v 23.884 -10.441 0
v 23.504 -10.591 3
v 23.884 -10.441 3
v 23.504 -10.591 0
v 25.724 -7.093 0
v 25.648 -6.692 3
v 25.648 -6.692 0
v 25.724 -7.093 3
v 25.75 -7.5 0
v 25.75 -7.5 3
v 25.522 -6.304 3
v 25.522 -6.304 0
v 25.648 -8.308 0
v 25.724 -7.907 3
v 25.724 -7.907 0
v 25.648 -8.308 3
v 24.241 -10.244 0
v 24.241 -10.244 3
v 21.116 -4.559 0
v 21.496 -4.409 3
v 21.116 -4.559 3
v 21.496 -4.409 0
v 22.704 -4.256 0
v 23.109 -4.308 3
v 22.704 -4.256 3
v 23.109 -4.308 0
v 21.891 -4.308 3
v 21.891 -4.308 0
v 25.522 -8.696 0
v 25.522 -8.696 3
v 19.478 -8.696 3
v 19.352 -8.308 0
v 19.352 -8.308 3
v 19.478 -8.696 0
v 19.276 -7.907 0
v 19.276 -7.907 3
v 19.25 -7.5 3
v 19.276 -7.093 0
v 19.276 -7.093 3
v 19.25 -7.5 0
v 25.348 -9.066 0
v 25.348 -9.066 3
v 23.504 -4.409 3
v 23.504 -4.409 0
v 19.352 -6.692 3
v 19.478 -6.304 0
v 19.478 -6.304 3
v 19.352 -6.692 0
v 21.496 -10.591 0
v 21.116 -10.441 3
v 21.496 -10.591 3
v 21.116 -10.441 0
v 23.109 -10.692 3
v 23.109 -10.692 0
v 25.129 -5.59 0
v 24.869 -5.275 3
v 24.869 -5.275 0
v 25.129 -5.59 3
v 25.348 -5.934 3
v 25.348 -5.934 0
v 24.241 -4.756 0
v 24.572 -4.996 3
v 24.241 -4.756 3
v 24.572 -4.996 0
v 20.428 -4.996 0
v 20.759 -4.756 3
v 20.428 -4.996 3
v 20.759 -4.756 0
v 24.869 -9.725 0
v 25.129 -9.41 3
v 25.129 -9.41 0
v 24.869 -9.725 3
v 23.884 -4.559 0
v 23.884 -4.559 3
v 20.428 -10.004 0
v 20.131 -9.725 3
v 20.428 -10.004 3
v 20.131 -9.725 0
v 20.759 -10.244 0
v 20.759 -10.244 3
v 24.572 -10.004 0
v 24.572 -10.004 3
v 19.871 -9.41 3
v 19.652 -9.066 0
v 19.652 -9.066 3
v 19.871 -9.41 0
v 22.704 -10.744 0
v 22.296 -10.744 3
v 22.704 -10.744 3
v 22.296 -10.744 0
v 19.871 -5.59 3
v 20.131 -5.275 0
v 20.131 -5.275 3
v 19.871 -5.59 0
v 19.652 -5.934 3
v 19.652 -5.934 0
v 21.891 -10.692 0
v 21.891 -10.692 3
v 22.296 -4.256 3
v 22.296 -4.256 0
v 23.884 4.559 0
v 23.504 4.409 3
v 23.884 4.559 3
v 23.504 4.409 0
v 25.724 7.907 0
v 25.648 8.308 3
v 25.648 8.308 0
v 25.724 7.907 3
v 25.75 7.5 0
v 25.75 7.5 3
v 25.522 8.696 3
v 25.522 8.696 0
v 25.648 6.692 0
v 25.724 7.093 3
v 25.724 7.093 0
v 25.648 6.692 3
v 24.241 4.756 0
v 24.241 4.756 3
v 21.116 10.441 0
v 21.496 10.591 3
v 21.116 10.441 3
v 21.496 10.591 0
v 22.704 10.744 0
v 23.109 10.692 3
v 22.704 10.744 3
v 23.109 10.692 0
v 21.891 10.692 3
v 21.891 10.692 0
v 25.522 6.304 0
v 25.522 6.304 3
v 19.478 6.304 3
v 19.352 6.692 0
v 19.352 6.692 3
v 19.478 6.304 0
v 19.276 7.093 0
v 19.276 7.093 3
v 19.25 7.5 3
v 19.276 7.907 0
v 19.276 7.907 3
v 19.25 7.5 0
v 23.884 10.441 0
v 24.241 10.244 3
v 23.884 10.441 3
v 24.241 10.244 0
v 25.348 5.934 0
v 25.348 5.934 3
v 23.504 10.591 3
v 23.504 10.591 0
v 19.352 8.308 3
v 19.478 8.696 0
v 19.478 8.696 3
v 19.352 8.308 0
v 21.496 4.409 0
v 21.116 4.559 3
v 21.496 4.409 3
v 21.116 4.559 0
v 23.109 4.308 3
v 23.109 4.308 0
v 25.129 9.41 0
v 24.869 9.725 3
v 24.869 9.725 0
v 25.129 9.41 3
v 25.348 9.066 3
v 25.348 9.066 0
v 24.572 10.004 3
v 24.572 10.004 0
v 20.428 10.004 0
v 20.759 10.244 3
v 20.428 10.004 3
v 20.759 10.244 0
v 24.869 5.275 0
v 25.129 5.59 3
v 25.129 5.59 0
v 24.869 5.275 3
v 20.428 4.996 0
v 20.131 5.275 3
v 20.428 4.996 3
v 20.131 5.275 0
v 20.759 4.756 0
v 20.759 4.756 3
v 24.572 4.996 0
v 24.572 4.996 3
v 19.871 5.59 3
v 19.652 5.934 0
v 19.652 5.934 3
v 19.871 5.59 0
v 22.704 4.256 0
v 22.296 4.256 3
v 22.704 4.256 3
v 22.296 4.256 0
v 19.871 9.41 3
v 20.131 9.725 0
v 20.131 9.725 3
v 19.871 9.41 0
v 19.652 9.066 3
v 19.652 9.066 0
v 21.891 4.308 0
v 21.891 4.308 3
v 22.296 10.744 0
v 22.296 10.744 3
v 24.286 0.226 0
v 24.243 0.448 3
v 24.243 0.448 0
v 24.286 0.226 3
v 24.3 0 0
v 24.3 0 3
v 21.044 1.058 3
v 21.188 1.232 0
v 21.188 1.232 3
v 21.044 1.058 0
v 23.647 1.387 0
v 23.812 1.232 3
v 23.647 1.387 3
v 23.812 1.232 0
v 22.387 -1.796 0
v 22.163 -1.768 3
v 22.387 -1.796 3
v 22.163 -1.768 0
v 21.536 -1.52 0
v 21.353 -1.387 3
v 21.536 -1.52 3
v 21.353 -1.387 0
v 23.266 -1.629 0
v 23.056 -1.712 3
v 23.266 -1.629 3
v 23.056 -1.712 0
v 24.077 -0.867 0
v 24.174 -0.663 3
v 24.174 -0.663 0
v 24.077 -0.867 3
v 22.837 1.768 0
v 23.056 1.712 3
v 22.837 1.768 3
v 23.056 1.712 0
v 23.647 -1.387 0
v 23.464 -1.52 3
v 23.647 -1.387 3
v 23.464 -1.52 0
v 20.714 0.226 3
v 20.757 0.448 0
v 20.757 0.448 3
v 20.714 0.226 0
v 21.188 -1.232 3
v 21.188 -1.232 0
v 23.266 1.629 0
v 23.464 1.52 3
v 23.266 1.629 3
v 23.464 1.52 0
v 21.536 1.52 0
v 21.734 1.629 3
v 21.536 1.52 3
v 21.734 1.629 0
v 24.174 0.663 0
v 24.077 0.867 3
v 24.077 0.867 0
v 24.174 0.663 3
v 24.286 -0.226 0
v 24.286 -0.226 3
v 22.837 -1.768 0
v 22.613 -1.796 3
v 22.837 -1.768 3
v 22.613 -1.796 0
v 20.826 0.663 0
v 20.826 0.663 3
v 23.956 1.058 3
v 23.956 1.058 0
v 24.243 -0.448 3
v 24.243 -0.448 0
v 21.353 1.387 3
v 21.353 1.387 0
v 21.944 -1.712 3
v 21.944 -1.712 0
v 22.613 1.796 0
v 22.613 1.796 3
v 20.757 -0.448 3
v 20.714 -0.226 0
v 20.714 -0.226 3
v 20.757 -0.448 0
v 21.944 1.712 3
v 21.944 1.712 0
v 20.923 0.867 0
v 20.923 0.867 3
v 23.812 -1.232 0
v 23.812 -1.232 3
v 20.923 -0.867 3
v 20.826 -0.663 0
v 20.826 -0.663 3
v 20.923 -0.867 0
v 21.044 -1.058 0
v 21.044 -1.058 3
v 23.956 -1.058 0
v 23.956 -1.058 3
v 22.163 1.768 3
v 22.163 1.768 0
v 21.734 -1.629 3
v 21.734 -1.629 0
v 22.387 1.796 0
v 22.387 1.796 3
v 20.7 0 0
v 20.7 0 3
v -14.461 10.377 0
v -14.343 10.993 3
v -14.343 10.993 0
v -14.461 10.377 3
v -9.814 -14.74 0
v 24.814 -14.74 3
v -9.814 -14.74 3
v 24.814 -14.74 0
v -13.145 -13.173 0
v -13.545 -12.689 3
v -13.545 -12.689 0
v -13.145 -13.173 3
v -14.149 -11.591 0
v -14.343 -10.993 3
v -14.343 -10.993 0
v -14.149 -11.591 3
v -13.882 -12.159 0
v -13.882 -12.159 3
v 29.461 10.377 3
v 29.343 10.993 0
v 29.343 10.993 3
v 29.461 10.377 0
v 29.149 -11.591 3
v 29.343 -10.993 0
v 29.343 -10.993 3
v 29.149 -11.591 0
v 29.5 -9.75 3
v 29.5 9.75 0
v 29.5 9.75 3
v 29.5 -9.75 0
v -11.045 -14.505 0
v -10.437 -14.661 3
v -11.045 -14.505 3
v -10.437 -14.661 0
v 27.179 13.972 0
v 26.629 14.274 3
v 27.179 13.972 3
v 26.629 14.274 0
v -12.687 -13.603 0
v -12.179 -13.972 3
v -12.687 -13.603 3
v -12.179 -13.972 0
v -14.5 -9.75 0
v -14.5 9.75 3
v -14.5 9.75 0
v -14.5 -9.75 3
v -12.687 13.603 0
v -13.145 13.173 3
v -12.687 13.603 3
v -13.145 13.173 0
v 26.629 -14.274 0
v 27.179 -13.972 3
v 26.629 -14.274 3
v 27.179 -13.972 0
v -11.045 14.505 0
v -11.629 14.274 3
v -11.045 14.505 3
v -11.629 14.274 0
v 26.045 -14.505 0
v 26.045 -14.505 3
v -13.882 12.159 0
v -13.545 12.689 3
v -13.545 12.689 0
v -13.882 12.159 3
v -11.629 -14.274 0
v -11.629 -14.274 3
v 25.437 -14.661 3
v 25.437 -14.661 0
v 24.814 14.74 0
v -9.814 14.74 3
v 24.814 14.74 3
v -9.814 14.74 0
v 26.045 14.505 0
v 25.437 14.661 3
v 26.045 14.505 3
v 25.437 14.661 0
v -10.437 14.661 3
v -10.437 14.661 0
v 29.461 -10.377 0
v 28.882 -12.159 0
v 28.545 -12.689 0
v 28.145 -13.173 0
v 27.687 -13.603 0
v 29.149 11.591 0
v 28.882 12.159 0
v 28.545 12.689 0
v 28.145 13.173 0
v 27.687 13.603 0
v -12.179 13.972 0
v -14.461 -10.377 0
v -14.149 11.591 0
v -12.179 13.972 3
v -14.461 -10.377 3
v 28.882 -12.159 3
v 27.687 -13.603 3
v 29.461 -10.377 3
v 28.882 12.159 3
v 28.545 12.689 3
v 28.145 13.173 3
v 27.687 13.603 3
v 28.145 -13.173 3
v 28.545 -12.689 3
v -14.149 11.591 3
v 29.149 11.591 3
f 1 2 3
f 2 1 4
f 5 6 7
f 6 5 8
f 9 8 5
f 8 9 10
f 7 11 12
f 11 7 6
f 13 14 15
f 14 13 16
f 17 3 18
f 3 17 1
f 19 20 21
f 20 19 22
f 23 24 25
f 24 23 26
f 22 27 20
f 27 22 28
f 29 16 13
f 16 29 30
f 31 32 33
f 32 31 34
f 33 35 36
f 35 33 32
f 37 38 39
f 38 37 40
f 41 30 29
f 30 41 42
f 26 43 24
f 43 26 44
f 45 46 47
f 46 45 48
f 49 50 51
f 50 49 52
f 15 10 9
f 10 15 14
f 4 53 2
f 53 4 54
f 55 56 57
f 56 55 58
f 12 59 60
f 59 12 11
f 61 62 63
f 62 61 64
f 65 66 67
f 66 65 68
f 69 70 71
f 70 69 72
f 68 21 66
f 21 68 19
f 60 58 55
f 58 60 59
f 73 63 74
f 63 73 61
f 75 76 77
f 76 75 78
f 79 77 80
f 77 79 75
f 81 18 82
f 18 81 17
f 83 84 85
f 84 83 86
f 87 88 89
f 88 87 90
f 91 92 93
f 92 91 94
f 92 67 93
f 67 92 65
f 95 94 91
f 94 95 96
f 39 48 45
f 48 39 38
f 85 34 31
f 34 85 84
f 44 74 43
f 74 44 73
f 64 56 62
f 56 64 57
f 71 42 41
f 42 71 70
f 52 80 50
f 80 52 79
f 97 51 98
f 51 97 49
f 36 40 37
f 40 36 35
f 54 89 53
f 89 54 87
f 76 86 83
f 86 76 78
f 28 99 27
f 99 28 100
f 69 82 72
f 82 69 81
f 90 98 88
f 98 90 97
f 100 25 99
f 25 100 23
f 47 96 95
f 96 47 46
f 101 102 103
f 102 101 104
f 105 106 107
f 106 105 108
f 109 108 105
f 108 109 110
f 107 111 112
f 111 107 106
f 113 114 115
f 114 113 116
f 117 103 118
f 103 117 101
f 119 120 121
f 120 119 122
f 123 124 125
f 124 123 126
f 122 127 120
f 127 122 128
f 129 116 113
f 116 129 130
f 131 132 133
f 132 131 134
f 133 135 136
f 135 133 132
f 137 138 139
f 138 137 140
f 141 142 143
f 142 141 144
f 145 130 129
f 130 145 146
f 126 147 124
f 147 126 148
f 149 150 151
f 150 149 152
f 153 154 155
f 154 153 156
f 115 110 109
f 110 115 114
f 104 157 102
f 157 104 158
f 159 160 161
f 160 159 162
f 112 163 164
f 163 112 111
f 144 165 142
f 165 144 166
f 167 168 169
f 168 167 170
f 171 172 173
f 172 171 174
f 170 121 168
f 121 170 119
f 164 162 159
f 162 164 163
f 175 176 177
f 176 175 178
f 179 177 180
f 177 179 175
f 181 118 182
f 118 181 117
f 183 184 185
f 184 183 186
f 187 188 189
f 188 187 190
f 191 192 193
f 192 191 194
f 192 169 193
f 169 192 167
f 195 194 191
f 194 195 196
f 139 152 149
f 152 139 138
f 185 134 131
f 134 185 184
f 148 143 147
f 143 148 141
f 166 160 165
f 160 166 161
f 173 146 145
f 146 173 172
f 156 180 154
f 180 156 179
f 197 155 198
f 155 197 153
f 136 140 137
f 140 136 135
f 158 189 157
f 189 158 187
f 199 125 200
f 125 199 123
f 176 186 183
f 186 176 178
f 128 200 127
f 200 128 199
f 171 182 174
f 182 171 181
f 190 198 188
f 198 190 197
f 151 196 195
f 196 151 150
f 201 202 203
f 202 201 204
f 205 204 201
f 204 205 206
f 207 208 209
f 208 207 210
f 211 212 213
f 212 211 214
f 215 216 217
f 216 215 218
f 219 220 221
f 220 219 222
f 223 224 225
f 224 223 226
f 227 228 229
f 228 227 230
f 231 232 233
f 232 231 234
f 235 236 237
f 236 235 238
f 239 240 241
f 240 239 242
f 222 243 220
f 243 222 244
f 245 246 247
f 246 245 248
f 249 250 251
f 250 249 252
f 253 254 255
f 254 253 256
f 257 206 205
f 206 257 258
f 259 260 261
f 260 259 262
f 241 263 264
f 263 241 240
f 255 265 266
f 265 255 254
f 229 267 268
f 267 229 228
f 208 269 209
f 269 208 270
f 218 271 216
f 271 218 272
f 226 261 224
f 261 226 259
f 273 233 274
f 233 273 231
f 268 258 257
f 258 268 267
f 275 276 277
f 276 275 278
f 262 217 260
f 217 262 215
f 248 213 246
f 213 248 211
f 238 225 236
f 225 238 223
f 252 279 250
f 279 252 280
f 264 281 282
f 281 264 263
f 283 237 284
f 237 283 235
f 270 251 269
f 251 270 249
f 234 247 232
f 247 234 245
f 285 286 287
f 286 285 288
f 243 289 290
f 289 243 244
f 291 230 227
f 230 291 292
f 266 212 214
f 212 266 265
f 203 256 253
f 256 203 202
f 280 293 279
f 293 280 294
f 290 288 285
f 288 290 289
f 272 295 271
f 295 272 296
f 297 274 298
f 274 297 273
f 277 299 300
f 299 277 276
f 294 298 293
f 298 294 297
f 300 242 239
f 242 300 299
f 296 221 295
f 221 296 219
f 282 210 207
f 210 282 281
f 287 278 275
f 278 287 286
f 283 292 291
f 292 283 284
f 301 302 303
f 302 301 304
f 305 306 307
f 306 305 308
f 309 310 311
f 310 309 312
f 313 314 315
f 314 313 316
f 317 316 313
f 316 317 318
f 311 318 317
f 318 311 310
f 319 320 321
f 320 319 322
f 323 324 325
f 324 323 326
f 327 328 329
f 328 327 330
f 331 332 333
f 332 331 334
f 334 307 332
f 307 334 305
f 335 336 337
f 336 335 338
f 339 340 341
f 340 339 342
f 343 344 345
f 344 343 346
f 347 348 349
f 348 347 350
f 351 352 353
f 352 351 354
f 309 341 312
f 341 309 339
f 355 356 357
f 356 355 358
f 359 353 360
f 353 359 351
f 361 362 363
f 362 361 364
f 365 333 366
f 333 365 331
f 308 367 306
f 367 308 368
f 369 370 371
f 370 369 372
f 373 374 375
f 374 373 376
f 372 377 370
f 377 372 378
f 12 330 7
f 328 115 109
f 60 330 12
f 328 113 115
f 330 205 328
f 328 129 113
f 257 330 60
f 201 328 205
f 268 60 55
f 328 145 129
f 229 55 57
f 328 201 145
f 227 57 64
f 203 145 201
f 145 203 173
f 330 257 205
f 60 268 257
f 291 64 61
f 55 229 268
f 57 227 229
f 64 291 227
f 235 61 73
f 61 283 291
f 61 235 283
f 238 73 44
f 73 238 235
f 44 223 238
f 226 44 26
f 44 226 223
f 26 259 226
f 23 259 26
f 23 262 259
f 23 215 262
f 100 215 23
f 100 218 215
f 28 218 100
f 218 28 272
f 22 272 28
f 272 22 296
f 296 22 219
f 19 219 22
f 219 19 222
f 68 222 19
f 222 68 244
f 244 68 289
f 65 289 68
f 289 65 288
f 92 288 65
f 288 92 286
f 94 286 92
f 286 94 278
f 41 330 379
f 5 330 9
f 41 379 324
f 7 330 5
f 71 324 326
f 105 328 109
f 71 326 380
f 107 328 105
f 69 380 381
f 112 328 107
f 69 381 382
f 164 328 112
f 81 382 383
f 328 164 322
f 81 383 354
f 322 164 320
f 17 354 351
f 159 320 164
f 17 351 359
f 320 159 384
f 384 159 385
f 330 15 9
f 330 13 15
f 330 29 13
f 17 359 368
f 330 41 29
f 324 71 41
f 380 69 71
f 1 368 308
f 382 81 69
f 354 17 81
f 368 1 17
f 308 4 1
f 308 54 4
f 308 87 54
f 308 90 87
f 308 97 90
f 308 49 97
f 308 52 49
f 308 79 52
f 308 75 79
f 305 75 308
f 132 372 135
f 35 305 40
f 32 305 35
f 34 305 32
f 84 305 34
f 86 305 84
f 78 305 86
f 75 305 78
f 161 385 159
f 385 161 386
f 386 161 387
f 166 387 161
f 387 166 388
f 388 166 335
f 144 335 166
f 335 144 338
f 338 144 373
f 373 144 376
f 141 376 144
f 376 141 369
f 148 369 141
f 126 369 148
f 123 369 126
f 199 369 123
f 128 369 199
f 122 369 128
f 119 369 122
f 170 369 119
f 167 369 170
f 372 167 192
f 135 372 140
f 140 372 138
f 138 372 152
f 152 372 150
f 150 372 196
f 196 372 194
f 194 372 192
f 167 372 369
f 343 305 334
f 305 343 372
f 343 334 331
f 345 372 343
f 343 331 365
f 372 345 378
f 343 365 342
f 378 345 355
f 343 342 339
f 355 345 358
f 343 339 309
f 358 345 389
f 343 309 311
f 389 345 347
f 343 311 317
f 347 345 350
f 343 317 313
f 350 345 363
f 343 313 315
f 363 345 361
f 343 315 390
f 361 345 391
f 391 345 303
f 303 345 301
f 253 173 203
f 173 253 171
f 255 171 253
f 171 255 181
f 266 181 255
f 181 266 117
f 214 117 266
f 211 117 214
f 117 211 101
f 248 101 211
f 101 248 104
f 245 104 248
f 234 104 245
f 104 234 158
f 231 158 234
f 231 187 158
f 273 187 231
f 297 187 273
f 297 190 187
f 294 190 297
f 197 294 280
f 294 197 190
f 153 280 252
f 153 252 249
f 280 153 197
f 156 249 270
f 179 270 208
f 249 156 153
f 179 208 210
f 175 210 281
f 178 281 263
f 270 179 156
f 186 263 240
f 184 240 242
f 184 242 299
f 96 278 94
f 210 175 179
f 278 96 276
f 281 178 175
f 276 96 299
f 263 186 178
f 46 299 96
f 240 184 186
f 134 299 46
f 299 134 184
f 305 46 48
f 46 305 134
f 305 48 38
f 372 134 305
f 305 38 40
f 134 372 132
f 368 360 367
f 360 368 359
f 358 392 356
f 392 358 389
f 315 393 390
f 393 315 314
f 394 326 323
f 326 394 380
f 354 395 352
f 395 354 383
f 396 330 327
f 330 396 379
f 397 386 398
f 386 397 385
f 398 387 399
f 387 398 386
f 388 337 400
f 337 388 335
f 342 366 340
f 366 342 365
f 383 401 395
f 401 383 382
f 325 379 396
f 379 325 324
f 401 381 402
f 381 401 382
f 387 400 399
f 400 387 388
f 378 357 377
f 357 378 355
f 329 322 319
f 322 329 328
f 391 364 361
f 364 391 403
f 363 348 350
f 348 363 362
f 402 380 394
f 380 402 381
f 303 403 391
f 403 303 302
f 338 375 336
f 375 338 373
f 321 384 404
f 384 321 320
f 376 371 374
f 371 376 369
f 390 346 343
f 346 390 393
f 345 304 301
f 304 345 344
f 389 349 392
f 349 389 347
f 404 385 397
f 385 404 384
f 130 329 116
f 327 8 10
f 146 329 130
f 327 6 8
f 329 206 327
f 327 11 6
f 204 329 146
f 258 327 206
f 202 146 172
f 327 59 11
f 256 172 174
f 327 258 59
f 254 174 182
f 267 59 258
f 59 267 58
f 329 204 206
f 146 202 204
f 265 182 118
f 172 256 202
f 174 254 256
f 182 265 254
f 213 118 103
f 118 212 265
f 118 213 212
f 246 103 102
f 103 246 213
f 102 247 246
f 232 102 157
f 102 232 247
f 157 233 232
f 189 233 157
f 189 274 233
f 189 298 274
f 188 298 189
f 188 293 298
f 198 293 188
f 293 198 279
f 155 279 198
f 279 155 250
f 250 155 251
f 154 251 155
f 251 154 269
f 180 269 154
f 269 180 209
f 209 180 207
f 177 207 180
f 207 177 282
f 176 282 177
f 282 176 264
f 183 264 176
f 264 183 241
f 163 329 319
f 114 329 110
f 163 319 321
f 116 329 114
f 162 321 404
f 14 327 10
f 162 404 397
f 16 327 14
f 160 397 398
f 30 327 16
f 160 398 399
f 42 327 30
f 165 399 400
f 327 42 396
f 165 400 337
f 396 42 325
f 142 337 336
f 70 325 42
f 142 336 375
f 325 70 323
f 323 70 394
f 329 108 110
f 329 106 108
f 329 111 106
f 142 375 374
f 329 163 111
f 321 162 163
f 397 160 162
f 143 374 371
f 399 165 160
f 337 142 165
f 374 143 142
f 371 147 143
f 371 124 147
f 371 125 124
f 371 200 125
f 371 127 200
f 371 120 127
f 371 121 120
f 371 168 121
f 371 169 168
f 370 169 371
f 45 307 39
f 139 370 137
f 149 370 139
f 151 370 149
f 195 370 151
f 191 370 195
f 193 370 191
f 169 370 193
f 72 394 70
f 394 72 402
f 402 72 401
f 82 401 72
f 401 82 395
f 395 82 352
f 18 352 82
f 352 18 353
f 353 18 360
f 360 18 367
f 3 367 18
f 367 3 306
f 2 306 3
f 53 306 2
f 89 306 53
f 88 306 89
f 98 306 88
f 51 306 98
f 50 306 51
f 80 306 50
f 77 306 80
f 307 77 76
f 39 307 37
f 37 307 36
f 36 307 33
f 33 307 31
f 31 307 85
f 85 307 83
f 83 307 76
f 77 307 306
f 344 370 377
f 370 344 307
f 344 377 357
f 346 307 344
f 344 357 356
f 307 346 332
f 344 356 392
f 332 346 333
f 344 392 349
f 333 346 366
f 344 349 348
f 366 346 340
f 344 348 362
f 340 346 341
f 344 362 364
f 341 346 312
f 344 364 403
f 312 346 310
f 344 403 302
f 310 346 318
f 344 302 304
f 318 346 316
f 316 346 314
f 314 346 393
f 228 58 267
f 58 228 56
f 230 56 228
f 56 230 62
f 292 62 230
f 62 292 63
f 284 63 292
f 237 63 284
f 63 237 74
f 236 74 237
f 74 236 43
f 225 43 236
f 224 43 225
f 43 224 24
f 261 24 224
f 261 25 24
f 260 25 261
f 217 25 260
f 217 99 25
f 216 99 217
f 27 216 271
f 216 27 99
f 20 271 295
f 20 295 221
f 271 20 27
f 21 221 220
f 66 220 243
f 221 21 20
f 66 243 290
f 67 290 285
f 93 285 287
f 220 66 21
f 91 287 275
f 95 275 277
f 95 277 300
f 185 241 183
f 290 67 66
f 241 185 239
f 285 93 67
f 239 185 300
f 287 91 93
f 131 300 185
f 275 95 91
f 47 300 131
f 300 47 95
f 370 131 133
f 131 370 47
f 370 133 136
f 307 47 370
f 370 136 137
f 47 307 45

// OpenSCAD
$fn = 50;

difference() {
	union() {
		translate(v = [7.5, 0.0, 0]) {
			hull() {
				translate(v = [-17.0, 9.75, 0]) {
					cylinder(h = 3, r = 5);
				}
				translate(v = [17.0, 9.75, 0]) {
					cylinder(h = 3, r = 5);
				}
				translate(v = [-17.0, -9.75, 0]) {
					cylinder(h = 3, r = 5);
				}
				translate(v = [17.0, -9.75, 0]) {
					cylinder(h = 3, r = 5);
				}
			}
		}
	}
	union() {
		translate(v = [22.5, -7.5, -1]) {
			cylinder(h = 5, r = 3.25);
		}
		translate(v = [22.5, 7.5, -1]) {
			cylinder(h = 5, r = 3.25);
		}
		translate(v = [22.5, 0.0, -1]) {
			cylinder(h = 5, r = 1.8);
		}
	}
}
